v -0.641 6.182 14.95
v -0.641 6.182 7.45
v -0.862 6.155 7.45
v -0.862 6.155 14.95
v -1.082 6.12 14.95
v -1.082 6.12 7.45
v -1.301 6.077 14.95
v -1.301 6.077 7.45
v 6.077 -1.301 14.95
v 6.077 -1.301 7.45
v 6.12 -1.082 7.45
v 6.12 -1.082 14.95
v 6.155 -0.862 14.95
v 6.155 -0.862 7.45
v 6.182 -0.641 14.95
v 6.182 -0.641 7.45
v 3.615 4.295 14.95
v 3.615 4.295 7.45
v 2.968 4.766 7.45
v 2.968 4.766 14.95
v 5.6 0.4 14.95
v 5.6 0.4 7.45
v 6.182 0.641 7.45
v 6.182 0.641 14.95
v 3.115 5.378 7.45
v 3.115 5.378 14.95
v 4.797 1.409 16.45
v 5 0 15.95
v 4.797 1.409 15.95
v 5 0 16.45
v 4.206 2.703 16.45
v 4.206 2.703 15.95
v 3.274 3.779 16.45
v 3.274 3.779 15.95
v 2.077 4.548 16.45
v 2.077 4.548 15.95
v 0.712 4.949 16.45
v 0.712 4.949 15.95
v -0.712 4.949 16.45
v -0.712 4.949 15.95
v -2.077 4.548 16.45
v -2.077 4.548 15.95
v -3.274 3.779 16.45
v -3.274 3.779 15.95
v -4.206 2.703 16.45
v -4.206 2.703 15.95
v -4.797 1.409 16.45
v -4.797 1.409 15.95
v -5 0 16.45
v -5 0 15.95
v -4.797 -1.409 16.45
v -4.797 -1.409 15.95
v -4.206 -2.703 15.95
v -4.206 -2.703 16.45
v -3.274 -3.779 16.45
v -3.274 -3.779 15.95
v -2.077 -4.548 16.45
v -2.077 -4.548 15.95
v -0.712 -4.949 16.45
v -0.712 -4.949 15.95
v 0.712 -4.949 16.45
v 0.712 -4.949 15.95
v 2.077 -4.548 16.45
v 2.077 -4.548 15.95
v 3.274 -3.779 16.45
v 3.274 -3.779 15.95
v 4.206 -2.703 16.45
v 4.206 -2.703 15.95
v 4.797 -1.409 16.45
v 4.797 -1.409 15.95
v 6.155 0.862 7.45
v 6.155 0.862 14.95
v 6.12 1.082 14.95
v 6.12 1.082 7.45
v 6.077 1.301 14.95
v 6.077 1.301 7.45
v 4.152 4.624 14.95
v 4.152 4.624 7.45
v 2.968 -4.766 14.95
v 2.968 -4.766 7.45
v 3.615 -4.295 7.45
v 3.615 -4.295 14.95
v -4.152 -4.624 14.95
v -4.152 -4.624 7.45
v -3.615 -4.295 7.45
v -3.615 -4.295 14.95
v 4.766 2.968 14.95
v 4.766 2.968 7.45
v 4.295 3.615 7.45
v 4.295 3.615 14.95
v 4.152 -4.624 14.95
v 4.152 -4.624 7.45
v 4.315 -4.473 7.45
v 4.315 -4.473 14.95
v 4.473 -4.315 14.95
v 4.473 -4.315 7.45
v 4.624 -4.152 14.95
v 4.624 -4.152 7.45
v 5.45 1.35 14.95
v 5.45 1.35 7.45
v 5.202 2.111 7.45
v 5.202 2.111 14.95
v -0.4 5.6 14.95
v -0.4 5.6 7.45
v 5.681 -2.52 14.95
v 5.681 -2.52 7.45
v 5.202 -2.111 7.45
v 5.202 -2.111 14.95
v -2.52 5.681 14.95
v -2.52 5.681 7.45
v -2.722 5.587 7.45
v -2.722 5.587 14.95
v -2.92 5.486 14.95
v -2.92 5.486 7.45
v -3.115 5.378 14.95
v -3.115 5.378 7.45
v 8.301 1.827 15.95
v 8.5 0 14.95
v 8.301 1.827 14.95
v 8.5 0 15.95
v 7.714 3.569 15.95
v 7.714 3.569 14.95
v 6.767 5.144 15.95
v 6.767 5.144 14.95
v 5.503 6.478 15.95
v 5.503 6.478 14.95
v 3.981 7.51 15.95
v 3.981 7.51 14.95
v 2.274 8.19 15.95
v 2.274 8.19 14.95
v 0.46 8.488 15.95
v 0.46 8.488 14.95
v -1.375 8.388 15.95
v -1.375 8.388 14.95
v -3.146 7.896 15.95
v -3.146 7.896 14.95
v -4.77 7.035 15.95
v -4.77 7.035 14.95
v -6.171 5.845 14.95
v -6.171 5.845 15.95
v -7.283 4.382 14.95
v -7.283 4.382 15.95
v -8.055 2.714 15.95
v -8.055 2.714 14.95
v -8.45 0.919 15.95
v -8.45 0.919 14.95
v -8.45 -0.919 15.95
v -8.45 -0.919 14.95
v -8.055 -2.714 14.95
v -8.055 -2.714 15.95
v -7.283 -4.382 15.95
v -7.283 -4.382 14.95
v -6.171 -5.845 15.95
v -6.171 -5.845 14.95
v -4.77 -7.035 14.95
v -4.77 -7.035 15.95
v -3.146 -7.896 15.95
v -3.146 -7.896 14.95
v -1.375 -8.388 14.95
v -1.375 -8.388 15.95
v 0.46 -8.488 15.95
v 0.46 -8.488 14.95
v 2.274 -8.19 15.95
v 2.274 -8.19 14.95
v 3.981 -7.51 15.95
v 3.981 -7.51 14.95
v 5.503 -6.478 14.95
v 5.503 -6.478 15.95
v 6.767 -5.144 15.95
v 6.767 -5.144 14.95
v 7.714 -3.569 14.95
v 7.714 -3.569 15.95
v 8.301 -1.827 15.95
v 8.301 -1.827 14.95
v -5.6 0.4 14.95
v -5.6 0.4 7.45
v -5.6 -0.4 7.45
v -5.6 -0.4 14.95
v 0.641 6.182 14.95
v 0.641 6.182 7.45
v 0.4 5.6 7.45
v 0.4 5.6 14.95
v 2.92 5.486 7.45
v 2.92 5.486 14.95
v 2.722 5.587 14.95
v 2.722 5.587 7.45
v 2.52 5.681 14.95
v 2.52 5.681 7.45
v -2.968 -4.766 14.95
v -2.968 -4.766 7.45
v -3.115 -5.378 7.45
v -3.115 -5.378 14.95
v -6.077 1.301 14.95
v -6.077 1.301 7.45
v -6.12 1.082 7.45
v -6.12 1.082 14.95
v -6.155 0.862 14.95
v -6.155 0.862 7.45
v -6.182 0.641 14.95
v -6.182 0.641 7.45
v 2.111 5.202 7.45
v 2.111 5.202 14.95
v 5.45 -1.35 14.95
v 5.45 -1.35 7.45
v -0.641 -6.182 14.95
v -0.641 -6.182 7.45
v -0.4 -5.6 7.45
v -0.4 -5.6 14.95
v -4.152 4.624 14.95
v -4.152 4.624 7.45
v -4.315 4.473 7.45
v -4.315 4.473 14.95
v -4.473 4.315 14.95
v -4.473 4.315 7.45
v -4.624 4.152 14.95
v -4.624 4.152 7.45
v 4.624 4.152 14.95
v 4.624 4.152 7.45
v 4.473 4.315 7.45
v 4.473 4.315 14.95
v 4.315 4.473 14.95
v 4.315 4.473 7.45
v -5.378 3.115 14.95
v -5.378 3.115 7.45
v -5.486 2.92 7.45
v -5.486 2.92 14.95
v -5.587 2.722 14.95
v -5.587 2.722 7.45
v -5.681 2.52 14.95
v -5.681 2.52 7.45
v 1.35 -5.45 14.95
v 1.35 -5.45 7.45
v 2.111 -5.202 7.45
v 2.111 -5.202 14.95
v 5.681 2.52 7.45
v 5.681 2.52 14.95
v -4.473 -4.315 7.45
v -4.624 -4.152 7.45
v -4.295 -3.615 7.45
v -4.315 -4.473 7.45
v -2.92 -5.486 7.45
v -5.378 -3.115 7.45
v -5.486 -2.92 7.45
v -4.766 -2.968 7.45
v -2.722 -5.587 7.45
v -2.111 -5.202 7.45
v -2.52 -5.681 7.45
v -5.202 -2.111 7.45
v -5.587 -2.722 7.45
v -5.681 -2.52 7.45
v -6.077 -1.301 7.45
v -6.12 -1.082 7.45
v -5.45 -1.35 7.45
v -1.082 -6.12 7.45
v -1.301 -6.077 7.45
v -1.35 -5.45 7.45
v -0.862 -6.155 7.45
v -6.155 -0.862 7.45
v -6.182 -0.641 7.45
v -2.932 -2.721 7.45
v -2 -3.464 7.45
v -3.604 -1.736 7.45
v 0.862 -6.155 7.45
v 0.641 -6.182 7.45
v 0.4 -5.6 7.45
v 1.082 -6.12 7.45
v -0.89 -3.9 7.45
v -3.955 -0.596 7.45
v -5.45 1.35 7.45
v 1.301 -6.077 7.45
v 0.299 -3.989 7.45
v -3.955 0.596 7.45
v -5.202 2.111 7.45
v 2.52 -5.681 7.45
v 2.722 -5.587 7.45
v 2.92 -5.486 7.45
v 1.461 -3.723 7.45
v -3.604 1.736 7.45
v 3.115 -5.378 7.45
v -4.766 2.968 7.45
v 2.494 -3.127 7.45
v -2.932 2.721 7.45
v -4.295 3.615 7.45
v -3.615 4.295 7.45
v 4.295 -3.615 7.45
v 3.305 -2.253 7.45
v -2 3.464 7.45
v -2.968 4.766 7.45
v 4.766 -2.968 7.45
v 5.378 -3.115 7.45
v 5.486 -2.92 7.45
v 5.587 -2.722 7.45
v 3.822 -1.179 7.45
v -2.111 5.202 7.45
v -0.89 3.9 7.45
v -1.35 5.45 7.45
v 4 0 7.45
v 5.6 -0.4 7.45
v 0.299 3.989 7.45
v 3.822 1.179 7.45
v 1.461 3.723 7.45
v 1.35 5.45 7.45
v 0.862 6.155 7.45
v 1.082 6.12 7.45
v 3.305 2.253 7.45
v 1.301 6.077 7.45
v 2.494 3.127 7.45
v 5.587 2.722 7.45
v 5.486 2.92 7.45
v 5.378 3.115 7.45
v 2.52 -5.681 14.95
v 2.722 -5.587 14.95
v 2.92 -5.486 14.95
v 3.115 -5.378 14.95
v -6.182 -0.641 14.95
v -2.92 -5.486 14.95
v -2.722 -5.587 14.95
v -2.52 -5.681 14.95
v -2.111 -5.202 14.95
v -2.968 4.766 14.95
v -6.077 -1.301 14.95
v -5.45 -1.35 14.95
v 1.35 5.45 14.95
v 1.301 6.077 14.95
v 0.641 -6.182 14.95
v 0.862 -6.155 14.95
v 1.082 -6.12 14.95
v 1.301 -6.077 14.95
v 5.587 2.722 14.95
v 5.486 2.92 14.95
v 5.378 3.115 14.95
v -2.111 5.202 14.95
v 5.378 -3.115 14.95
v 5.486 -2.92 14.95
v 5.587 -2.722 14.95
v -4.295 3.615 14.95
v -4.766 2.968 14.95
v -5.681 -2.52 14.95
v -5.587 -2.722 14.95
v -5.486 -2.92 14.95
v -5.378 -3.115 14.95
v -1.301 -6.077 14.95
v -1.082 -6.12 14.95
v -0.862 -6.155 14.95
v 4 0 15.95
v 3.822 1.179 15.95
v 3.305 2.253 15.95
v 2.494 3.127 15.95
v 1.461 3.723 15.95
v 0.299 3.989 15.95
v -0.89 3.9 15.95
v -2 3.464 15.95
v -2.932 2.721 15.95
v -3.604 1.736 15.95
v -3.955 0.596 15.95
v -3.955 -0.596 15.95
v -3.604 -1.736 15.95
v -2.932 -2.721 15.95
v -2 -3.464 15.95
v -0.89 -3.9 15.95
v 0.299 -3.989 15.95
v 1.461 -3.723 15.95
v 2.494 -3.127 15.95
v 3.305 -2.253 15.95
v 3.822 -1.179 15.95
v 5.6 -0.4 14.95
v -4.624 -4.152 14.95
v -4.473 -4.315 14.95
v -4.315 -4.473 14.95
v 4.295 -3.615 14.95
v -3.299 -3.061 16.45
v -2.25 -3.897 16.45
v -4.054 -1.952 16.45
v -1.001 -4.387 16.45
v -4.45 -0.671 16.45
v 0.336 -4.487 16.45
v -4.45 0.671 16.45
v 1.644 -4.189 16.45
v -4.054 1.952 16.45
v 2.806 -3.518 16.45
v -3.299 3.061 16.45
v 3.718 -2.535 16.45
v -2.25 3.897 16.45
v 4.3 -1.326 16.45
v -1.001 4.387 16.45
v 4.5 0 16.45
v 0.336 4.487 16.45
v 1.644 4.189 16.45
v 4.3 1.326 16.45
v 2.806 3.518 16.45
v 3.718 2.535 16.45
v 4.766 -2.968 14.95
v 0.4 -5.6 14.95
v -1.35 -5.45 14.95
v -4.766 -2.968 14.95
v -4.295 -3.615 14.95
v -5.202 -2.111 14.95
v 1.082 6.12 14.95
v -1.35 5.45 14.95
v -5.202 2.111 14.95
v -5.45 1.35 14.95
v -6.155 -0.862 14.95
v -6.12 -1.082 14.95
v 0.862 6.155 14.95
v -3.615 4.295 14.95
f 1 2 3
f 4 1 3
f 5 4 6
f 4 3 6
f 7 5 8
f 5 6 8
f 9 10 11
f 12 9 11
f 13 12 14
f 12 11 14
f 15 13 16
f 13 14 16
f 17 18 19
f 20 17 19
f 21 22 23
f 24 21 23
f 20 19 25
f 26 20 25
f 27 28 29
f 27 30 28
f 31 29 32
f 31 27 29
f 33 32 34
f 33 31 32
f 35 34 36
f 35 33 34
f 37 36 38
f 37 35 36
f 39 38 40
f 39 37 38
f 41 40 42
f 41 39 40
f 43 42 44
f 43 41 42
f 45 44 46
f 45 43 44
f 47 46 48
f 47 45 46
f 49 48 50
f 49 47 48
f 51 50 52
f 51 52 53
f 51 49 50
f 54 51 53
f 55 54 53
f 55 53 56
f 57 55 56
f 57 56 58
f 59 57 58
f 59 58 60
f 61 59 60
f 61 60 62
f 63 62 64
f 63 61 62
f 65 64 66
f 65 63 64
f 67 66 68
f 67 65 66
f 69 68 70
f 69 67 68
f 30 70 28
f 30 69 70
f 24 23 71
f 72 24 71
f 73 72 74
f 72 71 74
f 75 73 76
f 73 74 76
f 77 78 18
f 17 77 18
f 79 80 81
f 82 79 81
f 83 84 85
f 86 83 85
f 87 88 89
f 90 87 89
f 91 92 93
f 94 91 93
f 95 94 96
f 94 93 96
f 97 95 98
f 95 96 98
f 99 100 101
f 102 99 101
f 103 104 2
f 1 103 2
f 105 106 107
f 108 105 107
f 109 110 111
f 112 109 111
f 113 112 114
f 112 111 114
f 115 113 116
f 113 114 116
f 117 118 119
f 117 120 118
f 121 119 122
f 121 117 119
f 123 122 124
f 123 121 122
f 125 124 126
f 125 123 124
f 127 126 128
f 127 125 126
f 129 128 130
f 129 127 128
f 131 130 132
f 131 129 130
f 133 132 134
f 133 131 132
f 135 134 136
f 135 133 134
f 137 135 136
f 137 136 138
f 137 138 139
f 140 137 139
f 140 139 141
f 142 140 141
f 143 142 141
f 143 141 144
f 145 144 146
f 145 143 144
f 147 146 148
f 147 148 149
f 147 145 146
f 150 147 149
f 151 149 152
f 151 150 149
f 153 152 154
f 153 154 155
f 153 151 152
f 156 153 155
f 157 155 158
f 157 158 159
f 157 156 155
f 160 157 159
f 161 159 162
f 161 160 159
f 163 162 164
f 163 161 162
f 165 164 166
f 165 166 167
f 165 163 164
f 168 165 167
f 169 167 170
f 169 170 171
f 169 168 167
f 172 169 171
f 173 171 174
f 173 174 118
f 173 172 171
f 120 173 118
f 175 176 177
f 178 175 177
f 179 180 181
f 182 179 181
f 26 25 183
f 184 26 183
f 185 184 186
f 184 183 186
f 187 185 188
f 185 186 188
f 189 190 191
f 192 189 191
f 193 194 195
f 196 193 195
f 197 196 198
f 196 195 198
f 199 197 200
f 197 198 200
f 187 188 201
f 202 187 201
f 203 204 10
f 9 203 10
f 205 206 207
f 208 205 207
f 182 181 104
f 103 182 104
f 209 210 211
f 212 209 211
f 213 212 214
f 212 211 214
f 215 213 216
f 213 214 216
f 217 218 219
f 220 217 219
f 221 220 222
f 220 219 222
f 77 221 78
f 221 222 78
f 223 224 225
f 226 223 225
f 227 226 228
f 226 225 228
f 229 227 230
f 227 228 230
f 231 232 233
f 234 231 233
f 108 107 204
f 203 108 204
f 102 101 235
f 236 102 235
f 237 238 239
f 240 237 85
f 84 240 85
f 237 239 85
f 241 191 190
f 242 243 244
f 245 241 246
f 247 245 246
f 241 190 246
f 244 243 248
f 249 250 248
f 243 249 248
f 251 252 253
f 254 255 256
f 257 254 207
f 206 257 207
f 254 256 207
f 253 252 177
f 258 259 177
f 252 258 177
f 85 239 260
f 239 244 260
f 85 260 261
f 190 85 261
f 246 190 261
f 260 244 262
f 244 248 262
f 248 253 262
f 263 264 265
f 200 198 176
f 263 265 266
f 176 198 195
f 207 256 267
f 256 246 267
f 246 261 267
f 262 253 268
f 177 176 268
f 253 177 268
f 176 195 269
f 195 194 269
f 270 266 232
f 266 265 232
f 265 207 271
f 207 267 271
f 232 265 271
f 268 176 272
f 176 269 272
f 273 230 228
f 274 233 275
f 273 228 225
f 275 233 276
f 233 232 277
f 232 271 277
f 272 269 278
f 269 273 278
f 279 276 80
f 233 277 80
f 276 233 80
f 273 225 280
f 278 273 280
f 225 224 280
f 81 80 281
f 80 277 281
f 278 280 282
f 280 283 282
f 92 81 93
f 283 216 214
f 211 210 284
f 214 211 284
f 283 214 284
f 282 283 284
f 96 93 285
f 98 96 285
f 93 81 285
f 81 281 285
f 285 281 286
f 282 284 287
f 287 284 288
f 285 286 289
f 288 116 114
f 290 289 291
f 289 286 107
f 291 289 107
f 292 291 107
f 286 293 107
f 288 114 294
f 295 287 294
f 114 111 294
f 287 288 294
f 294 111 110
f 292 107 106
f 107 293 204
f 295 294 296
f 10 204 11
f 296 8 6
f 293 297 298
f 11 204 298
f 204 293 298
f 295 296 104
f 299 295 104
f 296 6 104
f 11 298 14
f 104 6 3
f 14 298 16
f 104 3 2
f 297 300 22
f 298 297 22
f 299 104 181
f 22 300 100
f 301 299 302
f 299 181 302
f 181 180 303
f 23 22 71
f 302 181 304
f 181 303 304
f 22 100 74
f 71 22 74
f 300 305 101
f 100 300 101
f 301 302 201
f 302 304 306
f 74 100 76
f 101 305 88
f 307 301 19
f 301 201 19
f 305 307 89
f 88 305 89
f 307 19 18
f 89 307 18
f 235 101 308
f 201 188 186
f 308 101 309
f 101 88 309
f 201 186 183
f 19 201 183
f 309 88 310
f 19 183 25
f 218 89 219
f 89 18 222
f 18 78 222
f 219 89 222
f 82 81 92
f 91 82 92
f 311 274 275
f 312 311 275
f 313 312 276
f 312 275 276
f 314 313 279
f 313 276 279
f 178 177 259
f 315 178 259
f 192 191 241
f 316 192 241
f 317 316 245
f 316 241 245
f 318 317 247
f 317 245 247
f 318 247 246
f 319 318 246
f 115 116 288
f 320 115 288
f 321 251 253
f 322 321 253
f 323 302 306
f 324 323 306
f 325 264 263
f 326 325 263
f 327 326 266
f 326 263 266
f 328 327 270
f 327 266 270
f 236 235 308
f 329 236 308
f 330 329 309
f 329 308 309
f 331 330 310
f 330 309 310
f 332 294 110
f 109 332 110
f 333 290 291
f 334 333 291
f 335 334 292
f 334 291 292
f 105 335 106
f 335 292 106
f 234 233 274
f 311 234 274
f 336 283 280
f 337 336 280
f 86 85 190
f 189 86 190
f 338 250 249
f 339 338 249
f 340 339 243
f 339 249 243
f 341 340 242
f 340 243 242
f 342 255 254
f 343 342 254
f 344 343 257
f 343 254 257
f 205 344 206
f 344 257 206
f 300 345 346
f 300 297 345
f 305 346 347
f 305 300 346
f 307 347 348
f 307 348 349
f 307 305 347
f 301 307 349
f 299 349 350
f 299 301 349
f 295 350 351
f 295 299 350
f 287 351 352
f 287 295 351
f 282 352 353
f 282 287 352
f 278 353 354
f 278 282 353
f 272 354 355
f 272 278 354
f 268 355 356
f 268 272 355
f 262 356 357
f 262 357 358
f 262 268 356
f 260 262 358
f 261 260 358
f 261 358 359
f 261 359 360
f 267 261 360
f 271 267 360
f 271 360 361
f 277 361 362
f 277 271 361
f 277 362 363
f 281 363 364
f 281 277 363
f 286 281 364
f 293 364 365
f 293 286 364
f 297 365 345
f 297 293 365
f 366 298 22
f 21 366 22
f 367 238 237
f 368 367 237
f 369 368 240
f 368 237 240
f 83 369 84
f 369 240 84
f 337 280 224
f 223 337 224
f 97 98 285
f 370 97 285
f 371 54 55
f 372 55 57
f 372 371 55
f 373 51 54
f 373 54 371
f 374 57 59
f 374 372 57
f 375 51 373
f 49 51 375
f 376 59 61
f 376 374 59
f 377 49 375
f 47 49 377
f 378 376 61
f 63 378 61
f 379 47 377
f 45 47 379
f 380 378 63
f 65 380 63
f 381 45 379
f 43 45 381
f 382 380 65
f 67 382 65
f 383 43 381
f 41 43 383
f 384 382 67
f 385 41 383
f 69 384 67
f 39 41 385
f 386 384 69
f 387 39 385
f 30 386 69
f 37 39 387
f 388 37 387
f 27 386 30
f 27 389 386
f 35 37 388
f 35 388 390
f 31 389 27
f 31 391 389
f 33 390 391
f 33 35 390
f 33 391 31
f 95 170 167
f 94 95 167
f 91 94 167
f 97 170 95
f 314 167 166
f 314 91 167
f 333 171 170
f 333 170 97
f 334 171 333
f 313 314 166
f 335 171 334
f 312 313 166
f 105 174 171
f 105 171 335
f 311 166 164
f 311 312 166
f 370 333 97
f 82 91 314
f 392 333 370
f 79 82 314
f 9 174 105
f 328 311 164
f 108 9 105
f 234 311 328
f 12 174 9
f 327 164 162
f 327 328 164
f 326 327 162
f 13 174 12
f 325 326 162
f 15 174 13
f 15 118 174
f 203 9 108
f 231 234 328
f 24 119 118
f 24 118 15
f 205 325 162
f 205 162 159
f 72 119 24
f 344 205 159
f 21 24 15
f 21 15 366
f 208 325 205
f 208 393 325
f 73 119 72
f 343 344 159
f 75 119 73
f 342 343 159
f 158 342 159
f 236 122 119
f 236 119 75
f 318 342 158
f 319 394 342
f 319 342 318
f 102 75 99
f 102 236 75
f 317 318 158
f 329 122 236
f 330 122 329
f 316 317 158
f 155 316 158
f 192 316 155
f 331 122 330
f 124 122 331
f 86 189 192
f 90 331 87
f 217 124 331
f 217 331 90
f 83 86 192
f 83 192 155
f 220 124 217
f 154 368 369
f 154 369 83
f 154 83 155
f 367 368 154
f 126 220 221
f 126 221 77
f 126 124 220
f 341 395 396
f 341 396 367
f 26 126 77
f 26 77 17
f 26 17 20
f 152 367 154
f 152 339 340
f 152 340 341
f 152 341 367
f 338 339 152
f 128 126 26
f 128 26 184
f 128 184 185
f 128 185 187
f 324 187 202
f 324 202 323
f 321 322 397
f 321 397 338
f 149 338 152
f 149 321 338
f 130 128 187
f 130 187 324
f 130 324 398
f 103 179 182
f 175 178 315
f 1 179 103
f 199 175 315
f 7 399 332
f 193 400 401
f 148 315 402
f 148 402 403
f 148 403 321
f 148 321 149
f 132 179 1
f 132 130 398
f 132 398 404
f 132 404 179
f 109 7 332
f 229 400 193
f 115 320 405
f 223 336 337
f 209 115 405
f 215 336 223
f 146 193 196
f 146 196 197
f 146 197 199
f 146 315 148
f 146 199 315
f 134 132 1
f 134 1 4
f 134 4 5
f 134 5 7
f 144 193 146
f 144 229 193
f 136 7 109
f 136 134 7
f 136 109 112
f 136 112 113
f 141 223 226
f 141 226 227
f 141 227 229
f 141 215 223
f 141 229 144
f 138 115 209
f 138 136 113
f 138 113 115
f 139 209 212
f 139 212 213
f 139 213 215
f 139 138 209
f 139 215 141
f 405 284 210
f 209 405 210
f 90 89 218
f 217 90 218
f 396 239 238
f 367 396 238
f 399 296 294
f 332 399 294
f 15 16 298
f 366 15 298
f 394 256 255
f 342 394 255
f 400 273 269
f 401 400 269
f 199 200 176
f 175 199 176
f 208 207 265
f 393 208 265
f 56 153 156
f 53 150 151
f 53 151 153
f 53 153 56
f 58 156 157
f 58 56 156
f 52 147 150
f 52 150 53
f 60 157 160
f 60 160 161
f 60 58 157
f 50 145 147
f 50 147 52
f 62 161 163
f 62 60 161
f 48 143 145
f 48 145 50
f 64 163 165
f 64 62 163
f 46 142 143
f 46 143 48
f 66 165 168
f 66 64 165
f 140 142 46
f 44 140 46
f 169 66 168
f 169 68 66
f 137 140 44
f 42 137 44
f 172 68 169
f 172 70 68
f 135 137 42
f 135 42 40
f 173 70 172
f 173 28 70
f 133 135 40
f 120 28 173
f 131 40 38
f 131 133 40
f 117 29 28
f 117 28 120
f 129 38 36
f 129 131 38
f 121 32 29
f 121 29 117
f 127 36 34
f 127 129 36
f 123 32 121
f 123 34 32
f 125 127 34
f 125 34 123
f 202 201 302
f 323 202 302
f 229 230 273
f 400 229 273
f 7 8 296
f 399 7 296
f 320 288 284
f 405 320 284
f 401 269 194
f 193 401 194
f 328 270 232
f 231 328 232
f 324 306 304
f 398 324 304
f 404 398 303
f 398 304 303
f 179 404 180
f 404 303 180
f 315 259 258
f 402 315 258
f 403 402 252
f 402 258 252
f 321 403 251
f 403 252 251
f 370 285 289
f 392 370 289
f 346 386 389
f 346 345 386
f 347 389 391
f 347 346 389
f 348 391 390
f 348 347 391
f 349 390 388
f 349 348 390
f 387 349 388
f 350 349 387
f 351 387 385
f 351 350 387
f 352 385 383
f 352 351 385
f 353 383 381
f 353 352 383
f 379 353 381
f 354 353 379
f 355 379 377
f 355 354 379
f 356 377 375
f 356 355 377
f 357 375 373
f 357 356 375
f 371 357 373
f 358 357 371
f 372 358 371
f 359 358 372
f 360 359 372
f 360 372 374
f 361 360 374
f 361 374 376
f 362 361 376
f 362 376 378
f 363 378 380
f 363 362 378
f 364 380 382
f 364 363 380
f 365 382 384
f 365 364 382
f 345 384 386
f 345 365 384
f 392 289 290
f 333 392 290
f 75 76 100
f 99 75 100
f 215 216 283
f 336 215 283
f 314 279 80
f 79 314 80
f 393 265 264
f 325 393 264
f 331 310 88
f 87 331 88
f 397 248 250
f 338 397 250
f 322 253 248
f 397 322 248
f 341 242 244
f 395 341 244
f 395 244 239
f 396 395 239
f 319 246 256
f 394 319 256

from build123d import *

# Parameters (mm, degrees)
CUT_EXTRUDE1_DEPTH       = 3
CHAMFER1_SIZE            = 0.259911356
CHAMFER1_SIZE2           = 0.226339217
CUT_EXTRUDE2_START       = 1
CUT_EXTRUDE2_2_OUTLINE_W = 16
CUT_EXTRUDE2_2_OUTLINE_H = 4
CUT_EXTRUDE2_2_DEPTH     = 6.45
CUT_EXTRUDE2_START_2     = 7.45
CUT_EXTRUDE2_3_OUTLINE_R = 5
CUT_EXTRUDE2_3_DEPTH     = 7.5


with BuildPart() as part:
    # Sketch1 → Revolve1 (revolve)
    with BuildSketch(Plane.XY.offset(3.725), mode=Mode.PRIVATE) as revolve1_sk:
        Polygon((1.614337285, 9), (0, 9), (0, 5), (0.595828025, 5), (1.614337285, 5.592863599), align=None)
    revolve(revolve1_sk.sketch.rotate(Axis((0, 9, 3.725), (0, -1, 0)), 270), axis=Axis((0, 9, 3.725), (0, -1, 0)))

    # Sketch2 → Cut-Extrude1 (cut)
    with BuildSketch(Plane(origin=(0, 9, 0), x_dir=(-1, 0, 0), z_dir=(0, 1, 0))):
        Polygon((0.877701457, 2.974684409), (1.088643091, 4.109953963), (0.210941634, 4.860269554), (-0.877701457, 4.475315591), (-1.088643091, 3.340046037), (-0.210941634, 2.589730446), align=None)
    extrude(amount=-CUT_EXTRUDE1_DEPTH, mode=Mode.SUBTRACT)

    # Chamfer1
    chamfer1_edges = [part.edges().sort_by_distance(p)[0] for p in [
        (0, 9, 5.339337285),
    ]]
    chamfer1_side = [part.faces().sort_by_distance(p)[0] for p in [
        (0, 9, 5.293676931),
    ]]
    chamfer(chamfer1_edges, length=CHAMFER1_SIZE, length2=CHAMFER1_SIZE2, reference=chamfer1_side[0])

    # Cut-Extrude2 2 outline → Cut-Extrude2 2 (cut)
    with BuildSketch(Plane.XY.offset(CUT_EXTRUDE2_START)):
        with Locations((0, 7)):
            Rectangle(CUT_EXTRUDE2_2_OUTLINE_W, CUT_EXTRUDE2_2_OUTLINE_H)
    extrude(amount=CUT_EXTRUDE2_2_DEPTH, mode=Mode.SUBTRACT)


with BuildPart() as body_2:
    # Cut-Extrude2: read off the stored shape, not the designer's step
    # Cut-Extrude2 outline → Cut-Extrude2 (revolve)
    with BuildSketch(Plane.XZ):
        Polygon((4, 7.45), (5, 7.45), (5, 14.95), (8.5, 14.95), (8.5, 15.95), (5, 15.95), (5, 16.45), (4.5, 16.45), (4, 15.95), align=None)
    revolve(axis=Axis((0, 0, 0), (0, 0, 1)))

    # Cut-Extrude2 3 outline → Cut-Extrude2 3 (add)
    with BuildSketch(Plane.XY.offset(CUT_EXTRUDE2_START_2)):
        with BuildLine():
            Line((1.30065941, -6.077376909), (1.350072562, -5.449523289))
            Line((1.350072562, -5.449523289), (2.110917775, -5.202309694))
            Line((2.110917775, -5.202309694), (2.519936953, -5.681209621))
            ThreePointArc((2.519936953, -5.681209621), (2.821550956, -5.537605548), (3.115013354, -5.37800305))
            Line((3.115013354, -5.37800305), (2.967990615, -4.765609269))
            Line((2.967990615, -4.765609269), (3.615204211, -4.295381068))
            Line((3.615204211, -4.295381068), (4.152192781, -4.624448087))
            ThreePointArc((4.152192781, -4.624448087), (4.394668645, -4.394668645), (4.624448087, -4.152192781))
            Line((4.624448087, -4.152192781), (4.295381068, -3.615204211))
            Line((4.295381068, -3.615204211), (4.765609269, -2.967990615))
            Line((4.765609269, -2.967990615), (5.37800305, -3.115013354))
            ThreePointArc((5.37800305, -3.115013354), (5.537605548, -2.821550956), (5.681209621, -2.519936953))
            Line((5.681209621, -2.519936953), (5.202309694, -2.110917775))
            Line((5.202309694, -2.110917775), (5.449523289, -1.350072562))
            Line((5.449523289, -1.350072562), (6.077376909, -1.30065941))
            ThreePointArc((6.077376909, -1.30065941), (6.138483037, -0.9722402), (6.181854773, -0.641012138))
            Line((6.181854773, -0.641012138), (5.6, -0.4))
            Line((5.6, -0.4), (5.6, 0.4))
            Line((5.6, 0.4), (6.181854773, 0.641012138))
            ThreePointArc((6.181854773, 0.641012138), (6.138483037, 0.9722402), (6.077376909, 1.30065941))
            Line((6.077376909, 1.30065941), (5.449523289, 1.350072562))
            Line((5.449523289, 1.350072562), (5.202309694, 2.110917775))
            Line((5.202309694, 2.110917775), (5.681209621, 2.519936953))
            ThreePointArc((5.681209621, 2.519936953), (5.537605548, 2.821550956), (5.37800305, 3.115013354))
            Line((5.37800305, 3.115013354), (4.765609269, 2.967990615))
            Line((4.765609269, 2.967990615), (4.295381068, 3.615204211))
            Line((4.295381068, 3.615204211), (4.624448087, 4.152192781))
            ThreePointArc((4.624448087, 4.152192781), (4.394668645, 4.394668645), (4.152192781, 4.624448087))
            Line((4.152192781, 4.624448087), (3.615204211, 4.295381068))
            Line((3.615204211, 4.295381068), (2.967990615, 4.765609269))
            Line((2.967990615, 4.765609269), (3.115013354, 5.37800305))
            ThreePointArc((3.115013354, 5.37800305), (2.821550956, 5.537605548), (2.519936953, 5.681209621))
            Line((2.519936953, 5.681209621), (2.110917775, 5.202309694))
            Line((2.110917775, 5.202309694), (1.350072562, 5.449523289))
            Line((1.350072562, 5.449523289), (1.30065941, 6.077376909))
            ThreePointArc((1.30065941, 6.077376909), (0.9722402, 6.138483037), (0.641012138, 6.181854773))
            Line((0.641012138, 6.181854773), (0.4, 5.6))
            Line((0.4, 5.6), (-0.4, 5.6))
            Line((-0.4, 5.6), (-0.641012138, 6.181854773))
            ThreePointArc((-0.641012138, 6.181854773), (-0.9722402, 6.138483037), (-1.30065941, 6.077376909))
            Line((-1.30065941, 6.077376909), (-1.350072562, 5.449523289))
            Line((-1.350072562, 5.449523289), (-2.110917775, 5.202309694))
            Line((-2.110917775, 5.202309694), (-2.519936953, 5.681209621))
            ThreePointArc((-2.519936953, 5.681209621), (-2.821550956, 5.537605548), (-3.115013354, 5.37800305))
            Line((-3.115013354, 5.37800305), (-2.967990615, 4.765609269))
            Line((-2.967990615, 4.765609269), (-3.615204211, 4.295381068))
            Line((-3.615204211, 4.295381068), (-4.152192781, 4.624448087))
            ThreePointArc((-4.152192781, 4.624448087), (-4.394668645, 4.394668645), (-4.624448087, 4.152192781))
            Line((-4.624448087, 4.152192781), (-4.295381068, 3.615204211))
            Line((-4.295381068, 3.615204211), (-4.765609269, 2.967990615))
            Line((-4.765609269, 2.967990615), (-5.37800305, 3.115013354))
            ThreePointArc((-5.37800305, 3.115013354), (-5.537605548, 2.821550956), (-5.681209621, 2.519936953))
            Line((-5.681209621, 2.519936953), (-5.202309694, 2.110917775))
            Line((-5.202309694, 2.110917775), (-5.449523289, 1.350072562))
            Line((-5.449523289, 1.350072562), (-6.077376909, 1.30065941))
            ThreePointArc((-6.077376909, 1.30065941), (-6.138483037, 0.9722402), (-6.181854773, 0.641012138))
            Line((-6.181854773, 0.641012138), (-5.6, 0.4))
            Line((-5.6, 0.4), (-5.6, -0.4))
            Line((-5.6, -0.4), (-6.181854773, -0.641012138))
            ThreePointArc((-6.181854773, -0.641012138), (-6.138483037, -0.9722402), (-6.077376909, -1.30065941))
            Line((-6.077376909, -1.30065941), (-5.449523289, -1.350072562))
            Line((-5.449523289, -1.350072562), (-5.202309694, -2.110917775))
            Line((-5.202309694, -2.110917775), (-5.681209621, -2.519936953))
            ThreePointArc((-5.681209621, -2.519936953), (-5.537605548, -2.821550956), (-5.37800305, -3.115013354))
            Line((-5.37800305, -3.115013354), (-4.765609269, -2.967990615))
            Line((-4.765609269, -2.967990615), (-4.295381068, -3.615204211))
            Line((-4.295381068, -3.615204211), (-4.624448087, -4.152192781))
            ThreePointArc((-4.624448087, -4.152192781), (-4.394668645, -4.394668645), (-4.152192781, -4.624448087))
            Line((-4.152192781, -4.624448087), (-3.615204211, -4.295381068))
            Line((-3.615204211, -4.295381068), (-2.967990615, -4.765609269))
            Line((-2.967990615, -4.765609269), (-3.115013354, -5.37800305))
            ThreePointArc((-3.115013354, -5.37800305), (-2.821550956, -5.537605548), (-2.519936953, -5.681209621))
            Line((-2.519936953, -5.681209621), (-2.110917775, -5.202309694))
            Line((-2.110917775, -5.202309694), (-1.350072562, -5.449523289))
            Line((-1.350072562, -5.449523289), (-1.30065941, -6.077376909))
            ThreePointArc((-1.30065941, -6.077376909), (-0.9722402, -6.138483037), (-0.641012138, -6.181854773))
            Line((-0.641012138, -6.181854773), (-0.4, -5.6))
            Line((-0.4, -5.6), (0.4, -5.6))
            Line((0.4, -5.6), (0.641012138, -6.181854773))
            ThreePointArc((0.641012138, -6.181854773), (0.9722402, -6.138483037), (1.30065941, -6.077376909))
        make_face()
        Circle(CUT_EXTRUDE2_3_OUTLINE_R, mode=Mode.SUBTRACT)
    extrude(amount=CUT_EXTRUDE2_3_DEPTH)


solid = body_2.part
